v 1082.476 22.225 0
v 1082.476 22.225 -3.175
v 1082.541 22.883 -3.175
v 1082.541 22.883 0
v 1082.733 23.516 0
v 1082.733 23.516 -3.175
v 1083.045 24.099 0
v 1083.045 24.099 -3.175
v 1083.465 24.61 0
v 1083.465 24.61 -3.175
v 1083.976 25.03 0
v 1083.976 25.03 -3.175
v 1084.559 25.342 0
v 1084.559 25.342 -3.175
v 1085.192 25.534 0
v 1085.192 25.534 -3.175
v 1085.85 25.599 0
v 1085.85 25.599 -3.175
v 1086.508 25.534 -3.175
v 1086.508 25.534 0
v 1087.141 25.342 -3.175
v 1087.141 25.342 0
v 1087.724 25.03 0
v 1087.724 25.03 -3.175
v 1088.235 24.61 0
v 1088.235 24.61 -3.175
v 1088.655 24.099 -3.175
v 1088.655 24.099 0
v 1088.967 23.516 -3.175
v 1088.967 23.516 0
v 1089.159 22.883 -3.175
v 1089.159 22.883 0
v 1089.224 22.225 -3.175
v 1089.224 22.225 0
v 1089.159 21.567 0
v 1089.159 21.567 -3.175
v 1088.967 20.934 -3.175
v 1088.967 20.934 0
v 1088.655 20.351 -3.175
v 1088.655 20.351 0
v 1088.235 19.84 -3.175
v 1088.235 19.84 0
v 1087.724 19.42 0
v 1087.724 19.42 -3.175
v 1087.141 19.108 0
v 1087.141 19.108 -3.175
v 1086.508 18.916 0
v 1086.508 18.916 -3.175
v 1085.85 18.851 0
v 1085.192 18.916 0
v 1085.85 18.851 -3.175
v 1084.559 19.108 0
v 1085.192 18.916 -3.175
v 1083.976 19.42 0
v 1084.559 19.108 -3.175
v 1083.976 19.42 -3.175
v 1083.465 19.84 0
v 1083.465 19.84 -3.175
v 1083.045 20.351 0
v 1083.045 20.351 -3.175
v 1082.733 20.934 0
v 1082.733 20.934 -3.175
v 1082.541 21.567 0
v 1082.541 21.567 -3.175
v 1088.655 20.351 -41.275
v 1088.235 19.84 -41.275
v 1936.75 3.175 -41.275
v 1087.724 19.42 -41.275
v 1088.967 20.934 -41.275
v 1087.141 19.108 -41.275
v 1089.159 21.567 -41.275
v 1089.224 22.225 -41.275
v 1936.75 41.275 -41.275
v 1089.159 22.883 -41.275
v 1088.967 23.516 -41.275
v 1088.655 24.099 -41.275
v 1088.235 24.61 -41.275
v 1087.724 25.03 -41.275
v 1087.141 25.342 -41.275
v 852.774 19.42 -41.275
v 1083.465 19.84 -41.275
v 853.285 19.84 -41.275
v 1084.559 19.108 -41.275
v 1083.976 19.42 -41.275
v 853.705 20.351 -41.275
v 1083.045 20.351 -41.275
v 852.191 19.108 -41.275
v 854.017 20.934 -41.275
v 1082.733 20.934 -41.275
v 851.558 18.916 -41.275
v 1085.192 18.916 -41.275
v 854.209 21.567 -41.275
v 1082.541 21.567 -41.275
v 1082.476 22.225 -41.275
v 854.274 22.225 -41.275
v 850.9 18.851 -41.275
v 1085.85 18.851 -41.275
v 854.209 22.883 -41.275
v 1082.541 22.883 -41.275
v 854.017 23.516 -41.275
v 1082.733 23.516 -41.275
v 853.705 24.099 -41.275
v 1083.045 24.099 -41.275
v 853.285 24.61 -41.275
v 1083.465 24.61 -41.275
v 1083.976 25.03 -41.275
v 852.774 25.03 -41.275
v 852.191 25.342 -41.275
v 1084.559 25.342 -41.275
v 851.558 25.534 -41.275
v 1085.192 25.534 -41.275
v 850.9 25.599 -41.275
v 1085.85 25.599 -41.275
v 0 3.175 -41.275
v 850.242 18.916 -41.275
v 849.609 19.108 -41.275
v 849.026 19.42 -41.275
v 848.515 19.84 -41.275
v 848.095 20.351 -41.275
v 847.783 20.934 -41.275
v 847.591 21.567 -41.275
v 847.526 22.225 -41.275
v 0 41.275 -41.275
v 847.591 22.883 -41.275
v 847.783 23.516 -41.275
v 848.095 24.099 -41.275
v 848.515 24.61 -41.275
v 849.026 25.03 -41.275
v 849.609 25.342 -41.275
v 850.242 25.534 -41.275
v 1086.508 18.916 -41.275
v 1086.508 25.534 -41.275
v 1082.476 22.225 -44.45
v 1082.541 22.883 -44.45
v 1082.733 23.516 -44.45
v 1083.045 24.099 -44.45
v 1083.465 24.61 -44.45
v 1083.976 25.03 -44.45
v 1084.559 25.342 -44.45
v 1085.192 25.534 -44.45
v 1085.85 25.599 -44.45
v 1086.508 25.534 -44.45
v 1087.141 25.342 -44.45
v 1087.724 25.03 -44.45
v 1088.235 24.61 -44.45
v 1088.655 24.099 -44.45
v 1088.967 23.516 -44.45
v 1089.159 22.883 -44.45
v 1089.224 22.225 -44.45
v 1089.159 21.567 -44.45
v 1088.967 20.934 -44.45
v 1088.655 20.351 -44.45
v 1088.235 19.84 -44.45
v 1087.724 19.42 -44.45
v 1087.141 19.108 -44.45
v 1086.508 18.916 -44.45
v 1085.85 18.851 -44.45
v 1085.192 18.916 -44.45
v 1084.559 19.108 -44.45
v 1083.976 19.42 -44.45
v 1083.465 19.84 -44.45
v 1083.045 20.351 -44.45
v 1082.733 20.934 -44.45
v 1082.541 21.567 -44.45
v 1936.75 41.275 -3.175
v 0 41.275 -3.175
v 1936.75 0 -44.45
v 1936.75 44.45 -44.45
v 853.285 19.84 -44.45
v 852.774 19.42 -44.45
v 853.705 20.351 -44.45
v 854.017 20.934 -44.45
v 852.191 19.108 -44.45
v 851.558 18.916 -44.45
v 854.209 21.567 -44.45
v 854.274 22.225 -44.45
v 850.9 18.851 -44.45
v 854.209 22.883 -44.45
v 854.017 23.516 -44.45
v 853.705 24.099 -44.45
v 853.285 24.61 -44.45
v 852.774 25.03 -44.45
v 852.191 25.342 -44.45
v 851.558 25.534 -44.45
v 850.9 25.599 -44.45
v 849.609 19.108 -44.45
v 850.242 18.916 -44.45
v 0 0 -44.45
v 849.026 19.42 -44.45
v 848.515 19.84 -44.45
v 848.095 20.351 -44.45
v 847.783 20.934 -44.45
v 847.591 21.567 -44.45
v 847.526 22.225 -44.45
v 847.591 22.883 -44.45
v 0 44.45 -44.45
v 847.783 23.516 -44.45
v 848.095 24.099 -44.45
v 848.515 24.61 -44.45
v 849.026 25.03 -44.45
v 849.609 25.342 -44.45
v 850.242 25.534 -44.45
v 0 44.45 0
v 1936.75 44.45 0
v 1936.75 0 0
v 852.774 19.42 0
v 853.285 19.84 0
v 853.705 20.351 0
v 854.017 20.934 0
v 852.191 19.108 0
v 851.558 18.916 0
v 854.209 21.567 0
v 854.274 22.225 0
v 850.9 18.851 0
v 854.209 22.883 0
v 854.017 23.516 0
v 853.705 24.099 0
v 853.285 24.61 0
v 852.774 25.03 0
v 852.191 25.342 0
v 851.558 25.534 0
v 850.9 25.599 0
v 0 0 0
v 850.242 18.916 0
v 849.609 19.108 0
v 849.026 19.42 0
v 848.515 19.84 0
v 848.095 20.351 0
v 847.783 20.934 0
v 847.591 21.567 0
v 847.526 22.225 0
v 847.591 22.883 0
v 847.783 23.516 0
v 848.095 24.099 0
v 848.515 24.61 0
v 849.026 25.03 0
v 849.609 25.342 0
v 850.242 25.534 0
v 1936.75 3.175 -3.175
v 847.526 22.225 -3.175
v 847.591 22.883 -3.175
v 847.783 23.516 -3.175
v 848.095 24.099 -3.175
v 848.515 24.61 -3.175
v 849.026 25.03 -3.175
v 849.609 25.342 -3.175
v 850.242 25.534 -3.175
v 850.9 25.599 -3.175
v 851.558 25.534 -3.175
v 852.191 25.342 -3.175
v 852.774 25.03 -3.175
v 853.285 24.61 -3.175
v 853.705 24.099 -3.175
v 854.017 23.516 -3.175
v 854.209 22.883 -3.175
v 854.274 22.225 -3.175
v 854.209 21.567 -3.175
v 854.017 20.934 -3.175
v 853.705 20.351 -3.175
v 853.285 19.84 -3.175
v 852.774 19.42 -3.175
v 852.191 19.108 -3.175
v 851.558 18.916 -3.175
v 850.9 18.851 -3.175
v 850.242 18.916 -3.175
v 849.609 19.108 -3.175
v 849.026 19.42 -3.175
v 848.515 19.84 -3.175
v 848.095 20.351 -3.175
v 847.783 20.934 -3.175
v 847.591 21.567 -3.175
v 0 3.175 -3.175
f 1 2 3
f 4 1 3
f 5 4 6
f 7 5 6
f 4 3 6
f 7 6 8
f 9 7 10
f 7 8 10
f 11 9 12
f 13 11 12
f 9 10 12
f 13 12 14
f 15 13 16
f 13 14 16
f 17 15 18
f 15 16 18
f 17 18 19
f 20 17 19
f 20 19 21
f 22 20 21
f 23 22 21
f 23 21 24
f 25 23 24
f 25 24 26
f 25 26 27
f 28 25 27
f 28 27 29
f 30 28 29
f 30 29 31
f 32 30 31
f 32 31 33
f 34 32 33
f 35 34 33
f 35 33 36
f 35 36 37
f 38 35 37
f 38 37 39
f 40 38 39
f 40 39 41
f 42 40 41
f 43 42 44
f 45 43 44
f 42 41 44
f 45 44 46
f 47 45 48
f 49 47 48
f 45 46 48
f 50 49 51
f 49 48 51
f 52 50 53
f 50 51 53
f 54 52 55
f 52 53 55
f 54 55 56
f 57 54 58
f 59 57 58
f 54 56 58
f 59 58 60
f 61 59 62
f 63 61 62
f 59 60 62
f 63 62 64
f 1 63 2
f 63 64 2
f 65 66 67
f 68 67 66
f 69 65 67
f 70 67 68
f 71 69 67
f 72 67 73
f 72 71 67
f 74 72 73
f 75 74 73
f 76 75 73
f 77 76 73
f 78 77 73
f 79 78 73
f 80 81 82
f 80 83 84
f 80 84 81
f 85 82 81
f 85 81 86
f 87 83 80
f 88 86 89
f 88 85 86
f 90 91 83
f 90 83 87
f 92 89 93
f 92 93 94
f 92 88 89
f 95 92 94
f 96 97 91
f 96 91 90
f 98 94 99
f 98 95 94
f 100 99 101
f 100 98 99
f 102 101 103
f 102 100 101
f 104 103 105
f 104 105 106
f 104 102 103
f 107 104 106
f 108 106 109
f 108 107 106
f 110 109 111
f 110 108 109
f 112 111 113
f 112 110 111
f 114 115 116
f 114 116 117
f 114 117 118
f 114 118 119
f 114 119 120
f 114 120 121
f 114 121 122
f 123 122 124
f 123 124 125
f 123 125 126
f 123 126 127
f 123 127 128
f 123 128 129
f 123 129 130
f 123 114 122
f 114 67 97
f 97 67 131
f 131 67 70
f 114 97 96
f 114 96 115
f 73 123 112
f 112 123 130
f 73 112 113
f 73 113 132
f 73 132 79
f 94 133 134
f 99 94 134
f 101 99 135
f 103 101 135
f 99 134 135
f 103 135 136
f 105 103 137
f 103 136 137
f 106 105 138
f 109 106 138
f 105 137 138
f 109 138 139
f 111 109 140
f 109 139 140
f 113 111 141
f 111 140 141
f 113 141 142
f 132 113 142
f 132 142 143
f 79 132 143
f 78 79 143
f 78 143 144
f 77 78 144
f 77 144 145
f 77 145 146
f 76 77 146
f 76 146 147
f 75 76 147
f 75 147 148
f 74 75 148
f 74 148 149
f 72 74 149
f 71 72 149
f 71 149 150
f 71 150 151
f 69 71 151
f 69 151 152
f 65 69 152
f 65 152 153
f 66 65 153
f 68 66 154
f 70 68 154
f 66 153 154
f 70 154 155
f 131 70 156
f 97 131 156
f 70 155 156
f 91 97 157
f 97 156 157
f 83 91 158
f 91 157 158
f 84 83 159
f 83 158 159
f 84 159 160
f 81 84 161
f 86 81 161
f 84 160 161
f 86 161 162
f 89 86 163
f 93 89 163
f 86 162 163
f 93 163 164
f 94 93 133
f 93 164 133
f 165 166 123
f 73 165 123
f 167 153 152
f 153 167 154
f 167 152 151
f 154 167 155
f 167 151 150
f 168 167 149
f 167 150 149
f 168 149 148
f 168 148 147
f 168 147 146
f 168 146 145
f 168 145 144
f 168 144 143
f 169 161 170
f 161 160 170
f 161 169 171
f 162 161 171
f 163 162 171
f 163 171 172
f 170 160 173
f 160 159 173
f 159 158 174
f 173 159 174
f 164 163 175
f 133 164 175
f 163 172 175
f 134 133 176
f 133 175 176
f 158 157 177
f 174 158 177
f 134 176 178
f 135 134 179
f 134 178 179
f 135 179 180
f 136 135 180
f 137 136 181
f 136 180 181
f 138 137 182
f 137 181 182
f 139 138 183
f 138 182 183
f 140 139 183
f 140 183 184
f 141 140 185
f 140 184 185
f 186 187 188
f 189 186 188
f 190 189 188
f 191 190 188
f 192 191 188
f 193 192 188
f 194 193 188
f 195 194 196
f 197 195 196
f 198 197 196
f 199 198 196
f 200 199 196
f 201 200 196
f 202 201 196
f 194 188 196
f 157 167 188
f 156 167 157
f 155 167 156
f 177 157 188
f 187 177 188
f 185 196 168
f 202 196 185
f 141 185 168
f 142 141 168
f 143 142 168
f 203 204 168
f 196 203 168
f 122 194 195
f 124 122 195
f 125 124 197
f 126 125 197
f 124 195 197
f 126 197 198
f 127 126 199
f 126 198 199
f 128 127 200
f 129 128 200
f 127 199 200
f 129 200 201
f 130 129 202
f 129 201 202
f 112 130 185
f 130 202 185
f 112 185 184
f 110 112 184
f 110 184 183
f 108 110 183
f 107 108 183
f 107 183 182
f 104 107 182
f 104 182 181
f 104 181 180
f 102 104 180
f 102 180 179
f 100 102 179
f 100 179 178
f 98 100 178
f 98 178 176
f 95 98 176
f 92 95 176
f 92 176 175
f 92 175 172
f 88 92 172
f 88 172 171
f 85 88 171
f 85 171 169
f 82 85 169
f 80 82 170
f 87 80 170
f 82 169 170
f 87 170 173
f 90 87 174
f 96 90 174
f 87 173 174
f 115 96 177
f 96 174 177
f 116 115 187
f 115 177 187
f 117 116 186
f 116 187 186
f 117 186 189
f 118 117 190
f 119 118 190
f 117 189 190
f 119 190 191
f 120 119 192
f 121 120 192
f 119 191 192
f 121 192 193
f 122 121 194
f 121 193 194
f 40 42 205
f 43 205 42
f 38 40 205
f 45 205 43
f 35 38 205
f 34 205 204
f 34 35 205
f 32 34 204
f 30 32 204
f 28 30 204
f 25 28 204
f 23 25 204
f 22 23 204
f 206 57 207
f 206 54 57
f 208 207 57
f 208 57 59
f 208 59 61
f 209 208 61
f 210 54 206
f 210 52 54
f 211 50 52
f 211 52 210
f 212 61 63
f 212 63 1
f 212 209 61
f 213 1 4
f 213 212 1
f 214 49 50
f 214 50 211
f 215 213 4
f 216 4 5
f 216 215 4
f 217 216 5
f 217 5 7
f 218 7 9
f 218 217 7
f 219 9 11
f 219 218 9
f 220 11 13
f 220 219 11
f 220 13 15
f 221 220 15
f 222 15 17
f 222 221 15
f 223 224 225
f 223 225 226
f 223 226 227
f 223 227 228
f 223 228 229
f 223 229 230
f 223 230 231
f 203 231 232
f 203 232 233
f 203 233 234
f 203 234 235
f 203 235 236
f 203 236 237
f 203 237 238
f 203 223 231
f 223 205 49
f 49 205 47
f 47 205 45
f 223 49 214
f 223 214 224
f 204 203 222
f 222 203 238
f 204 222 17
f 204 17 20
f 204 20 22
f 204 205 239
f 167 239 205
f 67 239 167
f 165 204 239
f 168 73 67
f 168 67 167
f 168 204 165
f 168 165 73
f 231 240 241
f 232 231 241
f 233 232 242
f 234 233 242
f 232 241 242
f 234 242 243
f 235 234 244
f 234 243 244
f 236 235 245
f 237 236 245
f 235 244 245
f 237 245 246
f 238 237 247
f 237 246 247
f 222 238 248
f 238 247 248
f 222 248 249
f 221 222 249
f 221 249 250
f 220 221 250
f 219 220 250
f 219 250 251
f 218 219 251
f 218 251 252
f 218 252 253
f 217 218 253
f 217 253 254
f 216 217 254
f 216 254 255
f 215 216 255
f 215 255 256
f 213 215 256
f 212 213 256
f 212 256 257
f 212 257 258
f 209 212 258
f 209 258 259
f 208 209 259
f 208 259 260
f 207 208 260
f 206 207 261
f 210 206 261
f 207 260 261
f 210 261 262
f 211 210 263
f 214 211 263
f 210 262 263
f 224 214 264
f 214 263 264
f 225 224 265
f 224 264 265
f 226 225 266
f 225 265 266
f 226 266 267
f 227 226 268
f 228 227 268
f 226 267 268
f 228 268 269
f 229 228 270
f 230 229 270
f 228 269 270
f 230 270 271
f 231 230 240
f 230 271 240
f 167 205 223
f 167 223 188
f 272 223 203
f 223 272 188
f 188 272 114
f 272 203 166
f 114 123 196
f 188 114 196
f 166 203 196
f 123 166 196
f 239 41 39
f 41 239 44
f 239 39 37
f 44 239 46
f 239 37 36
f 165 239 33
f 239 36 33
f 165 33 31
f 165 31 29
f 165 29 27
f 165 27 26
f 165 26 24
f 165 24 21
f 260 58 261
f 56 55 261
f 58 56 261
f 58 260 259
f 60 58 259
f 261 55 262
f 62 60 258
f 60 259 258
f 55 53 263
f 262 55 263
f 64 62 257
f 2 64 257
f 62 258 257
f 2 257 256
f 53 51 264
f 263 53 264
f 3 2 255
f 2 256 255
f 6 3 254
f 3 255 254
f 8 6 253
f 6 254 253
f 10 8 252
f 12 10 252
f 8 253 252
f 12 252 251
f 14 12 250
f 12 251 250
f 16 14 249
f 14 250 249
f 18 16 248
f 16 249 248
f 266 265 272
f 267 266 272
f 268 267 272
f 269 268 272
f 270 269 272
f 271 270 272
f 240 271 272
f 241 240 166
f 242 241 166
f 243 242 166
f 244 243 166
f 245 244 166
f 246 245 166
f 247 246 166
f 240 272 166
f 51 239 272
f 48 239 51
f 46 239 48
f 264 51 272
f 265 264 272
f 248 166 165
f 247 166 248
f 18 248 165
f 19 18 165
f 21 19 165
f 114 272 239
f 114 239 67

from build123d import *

# Parameters (mm, degrees)
SKETCH1_W                        = 44.45
SKETCH1_H                        = 44.45
SKETCH1_W_2                      = 38.1
SKETCH1_H_2                      = 38.1
BOSS_EXTRUDE1_DEPTH              = 1936.75
F_17_64_0_26563_DIAMETER_HOLE1_D = 6.747002


with BuildPart() as part:
    # Sketch1 → Boss-Extrude1 (new body)
    with BuildSketch(Plane(origin=(0, 0, 0), x_dir=(0, 0, -1), z_dir=(1, 0, 0))):
        with Locations((22.225, 22.225)):
            Rectangle(SKETCH1_W, SKETCH1_H)
        with Locations((22.225, 22.225)):
            Rectangle(SKETCH1_W_2, SKETCH1_H_2, mode=Mode.SUBTRACT)
    extrude(amount=BOSS_EXTRUDE1_DEPTH)

    # 17/64 (0.26563) Diameter Hole1 (through all)
    with Locations(Plane.XY):
        with Locations((850.9, 22.225), (1085.85, 22.225)):
            Hole(F_17_64_0_26563_DIAMETER_HOLE1_D / 2)


solid = part.part
